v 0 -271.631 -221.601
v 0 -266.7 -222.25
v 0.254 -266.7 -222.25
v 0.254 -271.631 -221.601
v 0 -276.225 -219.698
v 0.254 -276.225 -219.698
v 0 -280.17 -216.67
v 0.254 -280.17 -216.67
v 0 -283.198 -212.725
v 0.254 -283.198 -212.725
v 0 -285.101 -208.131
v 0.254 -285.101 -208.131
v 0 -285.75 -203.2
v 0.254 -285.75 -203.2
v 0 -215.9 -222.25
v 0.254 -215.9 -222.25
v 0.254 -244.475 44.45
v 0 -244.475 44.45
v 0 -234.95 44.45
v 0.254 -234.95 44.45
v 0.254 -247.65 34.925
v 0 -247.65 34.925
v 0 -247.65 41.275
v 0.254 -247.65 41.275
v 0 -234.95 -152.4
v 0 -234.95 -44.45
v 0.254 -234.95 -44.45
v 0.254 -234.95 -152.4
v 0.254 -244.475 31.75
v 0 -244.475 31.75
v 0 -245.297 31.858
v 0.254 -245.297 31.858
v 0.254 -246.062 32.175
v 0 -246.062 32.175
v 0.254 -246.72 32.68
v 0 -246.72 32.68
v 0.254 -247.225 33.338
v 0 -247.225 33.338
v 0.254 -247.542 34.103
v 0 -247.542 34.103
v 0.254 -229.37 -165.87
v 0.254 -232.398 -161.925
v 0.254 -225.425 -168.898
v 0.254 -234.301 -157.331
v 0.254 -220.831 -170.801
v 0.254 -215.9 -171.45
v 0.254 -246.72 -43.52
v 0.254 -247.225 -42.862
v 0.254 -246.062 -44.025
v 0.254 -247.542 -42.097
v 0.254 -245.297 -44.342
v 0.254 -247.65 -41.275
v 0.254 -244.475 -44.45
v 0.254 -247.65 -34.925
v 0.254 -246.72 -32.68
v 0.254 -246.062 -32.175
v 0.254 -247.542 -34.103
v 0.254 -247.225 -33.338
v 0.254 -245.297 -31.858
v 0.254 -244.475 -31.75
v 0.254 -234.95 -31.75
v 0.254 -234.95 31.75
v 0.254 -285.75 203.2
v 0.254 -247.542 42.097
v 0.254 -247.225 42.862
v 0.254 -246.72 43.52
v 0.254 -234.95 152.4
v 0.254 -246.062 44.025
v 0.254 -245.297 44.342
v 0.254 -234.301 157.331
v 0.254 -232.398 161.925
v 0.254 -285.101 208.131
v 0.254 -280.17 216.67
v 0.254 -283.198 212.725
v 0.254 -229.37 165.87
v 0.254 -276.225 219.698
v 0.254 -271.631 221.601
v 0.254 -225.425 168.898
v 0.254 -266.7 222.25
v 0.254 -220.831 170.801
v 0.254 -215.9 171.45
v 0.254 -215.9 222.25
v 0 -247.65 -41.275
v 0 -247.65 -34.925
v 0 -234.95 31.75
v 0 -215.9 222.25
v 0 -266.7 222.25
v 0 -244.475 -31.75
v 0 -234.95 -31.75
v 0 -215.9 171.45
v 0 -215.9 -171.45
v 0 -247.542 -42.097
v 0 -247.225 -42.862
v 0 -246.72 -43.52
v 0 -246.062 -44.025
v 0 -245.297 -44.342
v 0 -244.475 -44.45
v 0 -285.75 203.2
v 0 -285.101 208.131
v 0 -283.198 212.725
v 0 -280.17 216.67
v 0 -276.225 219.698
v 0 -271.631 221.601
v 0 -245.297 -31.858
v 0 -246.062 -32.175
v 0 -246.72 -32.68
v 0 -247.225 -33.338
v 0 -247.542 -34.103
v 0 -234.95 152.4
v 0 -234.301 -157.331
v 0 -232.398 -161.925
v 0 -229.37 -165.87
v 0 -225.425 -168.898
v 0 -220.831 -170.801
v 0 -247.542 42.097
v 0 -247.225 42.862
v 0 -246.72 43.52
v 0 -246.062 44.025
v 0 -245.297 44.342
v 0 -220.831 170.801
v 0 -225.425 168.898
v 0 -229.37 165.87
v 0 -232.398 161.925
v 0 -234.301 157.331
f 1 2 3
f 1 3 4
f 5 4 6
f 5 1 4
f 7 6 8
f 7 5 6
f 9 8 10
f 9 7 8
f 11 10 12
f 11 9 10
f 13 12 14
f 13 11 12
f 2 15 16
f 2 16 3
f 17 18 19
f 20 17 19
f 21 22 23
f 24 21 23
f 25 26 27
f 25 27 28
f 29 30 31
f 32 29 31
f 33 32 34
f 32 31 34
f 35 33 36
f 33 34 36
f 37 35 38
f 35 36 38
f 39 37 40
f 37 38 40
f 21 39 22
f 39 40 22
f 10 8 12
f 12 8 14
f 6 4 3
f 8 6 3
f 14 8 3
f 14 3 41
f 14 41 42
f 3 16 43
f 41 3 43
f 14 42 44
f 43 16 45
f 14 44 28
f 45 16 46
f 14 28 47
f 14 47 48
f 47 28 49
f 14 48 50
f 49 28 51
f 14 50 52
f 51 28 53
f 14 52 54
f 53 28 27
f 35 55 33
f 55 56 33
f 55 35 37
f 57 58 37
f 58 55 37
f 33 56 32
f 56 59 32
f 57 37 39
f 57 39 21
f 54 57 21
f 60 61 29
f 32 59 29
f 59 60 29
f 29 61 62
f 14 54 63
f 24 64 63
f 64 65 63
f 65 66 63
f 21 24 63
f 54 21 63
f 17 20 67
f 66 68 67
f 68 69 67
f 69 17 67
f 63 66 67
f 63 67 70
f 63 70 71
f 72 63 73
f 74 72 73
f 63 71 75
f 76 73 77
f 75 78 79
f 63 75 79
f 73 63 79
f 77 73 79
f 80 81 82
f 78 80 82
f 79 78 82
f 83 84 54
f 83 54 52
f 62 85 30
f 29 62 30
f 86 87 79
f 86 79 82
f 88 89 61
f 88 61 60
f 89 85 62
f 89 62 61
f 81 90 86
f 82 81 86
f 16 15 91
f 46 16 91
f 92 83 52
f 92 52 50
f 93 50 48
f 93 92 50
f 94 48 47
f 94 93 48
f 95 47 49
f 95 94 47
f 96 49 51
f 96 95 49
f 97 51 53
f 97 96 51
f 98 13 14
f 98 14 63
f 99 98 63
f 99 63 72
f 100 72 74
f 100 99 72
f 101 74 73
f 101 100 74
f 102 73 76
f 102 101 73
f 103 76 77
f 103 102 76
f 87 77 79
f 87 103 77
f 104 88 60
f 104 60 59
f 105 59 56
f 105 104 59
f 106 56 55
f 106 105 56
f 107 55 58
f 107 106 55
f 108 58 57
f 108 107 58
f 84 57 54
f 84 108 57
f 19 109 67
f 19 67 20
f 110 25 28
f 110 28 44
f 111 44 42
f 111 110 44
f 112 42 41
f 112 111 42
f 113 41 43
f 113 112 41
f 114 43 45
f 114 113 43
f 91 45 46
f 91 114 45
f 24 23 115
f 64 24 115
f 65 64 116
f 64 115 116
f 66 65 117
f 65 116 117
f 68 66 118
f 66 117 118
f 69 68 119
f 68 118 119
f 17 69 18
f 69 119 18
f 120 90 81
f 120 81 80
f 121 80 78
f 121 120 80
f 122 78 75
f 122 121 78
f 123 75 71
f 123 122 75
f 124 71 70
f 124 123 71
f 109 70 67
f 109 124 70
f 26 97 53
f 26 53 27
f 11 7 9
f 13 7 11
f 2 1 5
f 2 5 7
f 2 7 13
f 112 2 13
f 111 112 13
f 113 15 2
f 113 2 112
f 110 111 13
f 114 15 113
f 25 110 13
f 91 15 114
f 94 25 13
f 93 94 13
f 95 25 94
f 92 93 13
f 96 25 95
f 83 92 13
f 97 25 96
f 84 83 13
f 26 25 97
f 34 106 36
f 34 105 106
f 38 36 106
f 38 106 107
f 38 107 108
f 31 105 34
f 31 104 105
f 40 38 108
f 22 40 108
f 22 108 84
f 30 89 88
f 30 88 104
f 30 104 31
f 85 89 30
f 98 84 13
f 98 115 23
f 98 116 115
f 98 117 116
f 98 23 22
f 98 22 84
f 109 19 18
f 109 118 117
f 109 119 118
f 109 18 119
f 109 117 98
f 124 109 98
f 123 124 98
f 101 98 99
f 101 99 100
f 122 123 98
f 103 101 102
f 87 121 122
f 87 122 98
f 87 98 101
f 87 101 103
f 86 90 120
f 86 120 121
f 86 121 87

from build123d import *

# Parameters (mm, degrees)
BOSS_EXTRUDE2_DEPTH = 0.254
CUT_EXTRUDE1_DEPTH  = 1.254
SKETCH13_W          = 444.5
SKETCH13_H          = 215.9
CUT_EXTRUDE3_DEPTH  = 1.254


with BuildPart() as part:
    # Sketch1 → Boss-Extrude2 (new body)
    with BuildSketch(Plane(origin=(0, 0, 0), x_dir=(0, 0, -1), z_dir=(1, 0, 0))):
        with BuildLine():
            Line((-222.25, 0), (-171.45, 0))
            Line((-171.45, 0), (-171.45, -215.9))
            ThreePointArc((-171.45, -215.9), (-165.870384182, -229.370384182), (-152.4, -234.95))
            Line((-152.4, -234.95), (152.4, -234.95))
            ThreePointArc((152.4, -234.95), (165.870384182, -229.370384182), (171.45, -215.9))
            Line((171.45, -215.9), (171.45, 0))
            Line((171.45, 0), (222.25, 0))
            Line((222.25, 0), (222.25, -266.7))
            ThreePointArc((222.25, -266.7), (216.670384182, -280.170384182), (203.2, -285.75))
            Line((203.2, -285.75), (-203.2, -285.75))
            ThreePointArc((-203.2, -285.75), (-216.670384182, -280.170384182), (-222.25, -266.7))
            Line((-222.25, -266.7), (-222.25, 0))
        make_face()
    extrude(amount=BOSS_EXTRUDE2_DEPTH)

    # Sketch11 → Cut-Extrude1 (cut, through all)
    with BuildSketch(Plane.ZY):
        with BuildLine():
            Line((-171.45, -103.759), (-180.975, -103.759))
            ThreePointArc((-180.975, -103.759), (-183.22006403, -104.68893597), (-184.15, -106.934))
            Line((-184.15, -106.934), (-184.15, -133.604))
            ThreePointArc((-184.15, -133.604), (-183.22006403, -135.84906403), (-180.975, -136.779))
            Line((-180.975, -136.779), (-171.45, -136.779))
            Line((-171.45, -136.779), (-171.45, -103.759))
        make_face()
        with BuildLine():
            Line((-44.45, -234.95), (-31.75, -234.95))
            Line((-31.75, -234.95), (-31.75, -244.475))
            ThreePointArc((-31.75, -244.475), (-32.67993597, -246.72006403), (-34.925, -247.65))
            Line((-34.925, -247.65), (-41.275, -247.65))
            ThreePointArc((-41.275, -247.65), (-43.52006403, -246.72006403), (-44.45, -244.475))
            Line((-44.45, -244.475), (-44.45, -234.95))
        make_face()
    cut_extrude1 = extrude(amount=-CUT_EXTRUDE1_DEPTH, mode=Mode.SUBTRACT)

    # Mirror2: Cut-Extrude1 across plane
    add(cut_extrude1.mirror(Plane.XY), mode=Mode.SUBTRACT)

    # Sketch13 → Cut-Extrude3 (cut, through all)
    with BuildSketch(Plane.ZY):
        with Locations((0, -107.95)):
            Rectangle(SKETCH13_W, SKETCH13_H)
    extrude(amount=-CUT_EXTRUDE3_DEPTH, mode=Mode.SUBTRACT)


solid = part.part
